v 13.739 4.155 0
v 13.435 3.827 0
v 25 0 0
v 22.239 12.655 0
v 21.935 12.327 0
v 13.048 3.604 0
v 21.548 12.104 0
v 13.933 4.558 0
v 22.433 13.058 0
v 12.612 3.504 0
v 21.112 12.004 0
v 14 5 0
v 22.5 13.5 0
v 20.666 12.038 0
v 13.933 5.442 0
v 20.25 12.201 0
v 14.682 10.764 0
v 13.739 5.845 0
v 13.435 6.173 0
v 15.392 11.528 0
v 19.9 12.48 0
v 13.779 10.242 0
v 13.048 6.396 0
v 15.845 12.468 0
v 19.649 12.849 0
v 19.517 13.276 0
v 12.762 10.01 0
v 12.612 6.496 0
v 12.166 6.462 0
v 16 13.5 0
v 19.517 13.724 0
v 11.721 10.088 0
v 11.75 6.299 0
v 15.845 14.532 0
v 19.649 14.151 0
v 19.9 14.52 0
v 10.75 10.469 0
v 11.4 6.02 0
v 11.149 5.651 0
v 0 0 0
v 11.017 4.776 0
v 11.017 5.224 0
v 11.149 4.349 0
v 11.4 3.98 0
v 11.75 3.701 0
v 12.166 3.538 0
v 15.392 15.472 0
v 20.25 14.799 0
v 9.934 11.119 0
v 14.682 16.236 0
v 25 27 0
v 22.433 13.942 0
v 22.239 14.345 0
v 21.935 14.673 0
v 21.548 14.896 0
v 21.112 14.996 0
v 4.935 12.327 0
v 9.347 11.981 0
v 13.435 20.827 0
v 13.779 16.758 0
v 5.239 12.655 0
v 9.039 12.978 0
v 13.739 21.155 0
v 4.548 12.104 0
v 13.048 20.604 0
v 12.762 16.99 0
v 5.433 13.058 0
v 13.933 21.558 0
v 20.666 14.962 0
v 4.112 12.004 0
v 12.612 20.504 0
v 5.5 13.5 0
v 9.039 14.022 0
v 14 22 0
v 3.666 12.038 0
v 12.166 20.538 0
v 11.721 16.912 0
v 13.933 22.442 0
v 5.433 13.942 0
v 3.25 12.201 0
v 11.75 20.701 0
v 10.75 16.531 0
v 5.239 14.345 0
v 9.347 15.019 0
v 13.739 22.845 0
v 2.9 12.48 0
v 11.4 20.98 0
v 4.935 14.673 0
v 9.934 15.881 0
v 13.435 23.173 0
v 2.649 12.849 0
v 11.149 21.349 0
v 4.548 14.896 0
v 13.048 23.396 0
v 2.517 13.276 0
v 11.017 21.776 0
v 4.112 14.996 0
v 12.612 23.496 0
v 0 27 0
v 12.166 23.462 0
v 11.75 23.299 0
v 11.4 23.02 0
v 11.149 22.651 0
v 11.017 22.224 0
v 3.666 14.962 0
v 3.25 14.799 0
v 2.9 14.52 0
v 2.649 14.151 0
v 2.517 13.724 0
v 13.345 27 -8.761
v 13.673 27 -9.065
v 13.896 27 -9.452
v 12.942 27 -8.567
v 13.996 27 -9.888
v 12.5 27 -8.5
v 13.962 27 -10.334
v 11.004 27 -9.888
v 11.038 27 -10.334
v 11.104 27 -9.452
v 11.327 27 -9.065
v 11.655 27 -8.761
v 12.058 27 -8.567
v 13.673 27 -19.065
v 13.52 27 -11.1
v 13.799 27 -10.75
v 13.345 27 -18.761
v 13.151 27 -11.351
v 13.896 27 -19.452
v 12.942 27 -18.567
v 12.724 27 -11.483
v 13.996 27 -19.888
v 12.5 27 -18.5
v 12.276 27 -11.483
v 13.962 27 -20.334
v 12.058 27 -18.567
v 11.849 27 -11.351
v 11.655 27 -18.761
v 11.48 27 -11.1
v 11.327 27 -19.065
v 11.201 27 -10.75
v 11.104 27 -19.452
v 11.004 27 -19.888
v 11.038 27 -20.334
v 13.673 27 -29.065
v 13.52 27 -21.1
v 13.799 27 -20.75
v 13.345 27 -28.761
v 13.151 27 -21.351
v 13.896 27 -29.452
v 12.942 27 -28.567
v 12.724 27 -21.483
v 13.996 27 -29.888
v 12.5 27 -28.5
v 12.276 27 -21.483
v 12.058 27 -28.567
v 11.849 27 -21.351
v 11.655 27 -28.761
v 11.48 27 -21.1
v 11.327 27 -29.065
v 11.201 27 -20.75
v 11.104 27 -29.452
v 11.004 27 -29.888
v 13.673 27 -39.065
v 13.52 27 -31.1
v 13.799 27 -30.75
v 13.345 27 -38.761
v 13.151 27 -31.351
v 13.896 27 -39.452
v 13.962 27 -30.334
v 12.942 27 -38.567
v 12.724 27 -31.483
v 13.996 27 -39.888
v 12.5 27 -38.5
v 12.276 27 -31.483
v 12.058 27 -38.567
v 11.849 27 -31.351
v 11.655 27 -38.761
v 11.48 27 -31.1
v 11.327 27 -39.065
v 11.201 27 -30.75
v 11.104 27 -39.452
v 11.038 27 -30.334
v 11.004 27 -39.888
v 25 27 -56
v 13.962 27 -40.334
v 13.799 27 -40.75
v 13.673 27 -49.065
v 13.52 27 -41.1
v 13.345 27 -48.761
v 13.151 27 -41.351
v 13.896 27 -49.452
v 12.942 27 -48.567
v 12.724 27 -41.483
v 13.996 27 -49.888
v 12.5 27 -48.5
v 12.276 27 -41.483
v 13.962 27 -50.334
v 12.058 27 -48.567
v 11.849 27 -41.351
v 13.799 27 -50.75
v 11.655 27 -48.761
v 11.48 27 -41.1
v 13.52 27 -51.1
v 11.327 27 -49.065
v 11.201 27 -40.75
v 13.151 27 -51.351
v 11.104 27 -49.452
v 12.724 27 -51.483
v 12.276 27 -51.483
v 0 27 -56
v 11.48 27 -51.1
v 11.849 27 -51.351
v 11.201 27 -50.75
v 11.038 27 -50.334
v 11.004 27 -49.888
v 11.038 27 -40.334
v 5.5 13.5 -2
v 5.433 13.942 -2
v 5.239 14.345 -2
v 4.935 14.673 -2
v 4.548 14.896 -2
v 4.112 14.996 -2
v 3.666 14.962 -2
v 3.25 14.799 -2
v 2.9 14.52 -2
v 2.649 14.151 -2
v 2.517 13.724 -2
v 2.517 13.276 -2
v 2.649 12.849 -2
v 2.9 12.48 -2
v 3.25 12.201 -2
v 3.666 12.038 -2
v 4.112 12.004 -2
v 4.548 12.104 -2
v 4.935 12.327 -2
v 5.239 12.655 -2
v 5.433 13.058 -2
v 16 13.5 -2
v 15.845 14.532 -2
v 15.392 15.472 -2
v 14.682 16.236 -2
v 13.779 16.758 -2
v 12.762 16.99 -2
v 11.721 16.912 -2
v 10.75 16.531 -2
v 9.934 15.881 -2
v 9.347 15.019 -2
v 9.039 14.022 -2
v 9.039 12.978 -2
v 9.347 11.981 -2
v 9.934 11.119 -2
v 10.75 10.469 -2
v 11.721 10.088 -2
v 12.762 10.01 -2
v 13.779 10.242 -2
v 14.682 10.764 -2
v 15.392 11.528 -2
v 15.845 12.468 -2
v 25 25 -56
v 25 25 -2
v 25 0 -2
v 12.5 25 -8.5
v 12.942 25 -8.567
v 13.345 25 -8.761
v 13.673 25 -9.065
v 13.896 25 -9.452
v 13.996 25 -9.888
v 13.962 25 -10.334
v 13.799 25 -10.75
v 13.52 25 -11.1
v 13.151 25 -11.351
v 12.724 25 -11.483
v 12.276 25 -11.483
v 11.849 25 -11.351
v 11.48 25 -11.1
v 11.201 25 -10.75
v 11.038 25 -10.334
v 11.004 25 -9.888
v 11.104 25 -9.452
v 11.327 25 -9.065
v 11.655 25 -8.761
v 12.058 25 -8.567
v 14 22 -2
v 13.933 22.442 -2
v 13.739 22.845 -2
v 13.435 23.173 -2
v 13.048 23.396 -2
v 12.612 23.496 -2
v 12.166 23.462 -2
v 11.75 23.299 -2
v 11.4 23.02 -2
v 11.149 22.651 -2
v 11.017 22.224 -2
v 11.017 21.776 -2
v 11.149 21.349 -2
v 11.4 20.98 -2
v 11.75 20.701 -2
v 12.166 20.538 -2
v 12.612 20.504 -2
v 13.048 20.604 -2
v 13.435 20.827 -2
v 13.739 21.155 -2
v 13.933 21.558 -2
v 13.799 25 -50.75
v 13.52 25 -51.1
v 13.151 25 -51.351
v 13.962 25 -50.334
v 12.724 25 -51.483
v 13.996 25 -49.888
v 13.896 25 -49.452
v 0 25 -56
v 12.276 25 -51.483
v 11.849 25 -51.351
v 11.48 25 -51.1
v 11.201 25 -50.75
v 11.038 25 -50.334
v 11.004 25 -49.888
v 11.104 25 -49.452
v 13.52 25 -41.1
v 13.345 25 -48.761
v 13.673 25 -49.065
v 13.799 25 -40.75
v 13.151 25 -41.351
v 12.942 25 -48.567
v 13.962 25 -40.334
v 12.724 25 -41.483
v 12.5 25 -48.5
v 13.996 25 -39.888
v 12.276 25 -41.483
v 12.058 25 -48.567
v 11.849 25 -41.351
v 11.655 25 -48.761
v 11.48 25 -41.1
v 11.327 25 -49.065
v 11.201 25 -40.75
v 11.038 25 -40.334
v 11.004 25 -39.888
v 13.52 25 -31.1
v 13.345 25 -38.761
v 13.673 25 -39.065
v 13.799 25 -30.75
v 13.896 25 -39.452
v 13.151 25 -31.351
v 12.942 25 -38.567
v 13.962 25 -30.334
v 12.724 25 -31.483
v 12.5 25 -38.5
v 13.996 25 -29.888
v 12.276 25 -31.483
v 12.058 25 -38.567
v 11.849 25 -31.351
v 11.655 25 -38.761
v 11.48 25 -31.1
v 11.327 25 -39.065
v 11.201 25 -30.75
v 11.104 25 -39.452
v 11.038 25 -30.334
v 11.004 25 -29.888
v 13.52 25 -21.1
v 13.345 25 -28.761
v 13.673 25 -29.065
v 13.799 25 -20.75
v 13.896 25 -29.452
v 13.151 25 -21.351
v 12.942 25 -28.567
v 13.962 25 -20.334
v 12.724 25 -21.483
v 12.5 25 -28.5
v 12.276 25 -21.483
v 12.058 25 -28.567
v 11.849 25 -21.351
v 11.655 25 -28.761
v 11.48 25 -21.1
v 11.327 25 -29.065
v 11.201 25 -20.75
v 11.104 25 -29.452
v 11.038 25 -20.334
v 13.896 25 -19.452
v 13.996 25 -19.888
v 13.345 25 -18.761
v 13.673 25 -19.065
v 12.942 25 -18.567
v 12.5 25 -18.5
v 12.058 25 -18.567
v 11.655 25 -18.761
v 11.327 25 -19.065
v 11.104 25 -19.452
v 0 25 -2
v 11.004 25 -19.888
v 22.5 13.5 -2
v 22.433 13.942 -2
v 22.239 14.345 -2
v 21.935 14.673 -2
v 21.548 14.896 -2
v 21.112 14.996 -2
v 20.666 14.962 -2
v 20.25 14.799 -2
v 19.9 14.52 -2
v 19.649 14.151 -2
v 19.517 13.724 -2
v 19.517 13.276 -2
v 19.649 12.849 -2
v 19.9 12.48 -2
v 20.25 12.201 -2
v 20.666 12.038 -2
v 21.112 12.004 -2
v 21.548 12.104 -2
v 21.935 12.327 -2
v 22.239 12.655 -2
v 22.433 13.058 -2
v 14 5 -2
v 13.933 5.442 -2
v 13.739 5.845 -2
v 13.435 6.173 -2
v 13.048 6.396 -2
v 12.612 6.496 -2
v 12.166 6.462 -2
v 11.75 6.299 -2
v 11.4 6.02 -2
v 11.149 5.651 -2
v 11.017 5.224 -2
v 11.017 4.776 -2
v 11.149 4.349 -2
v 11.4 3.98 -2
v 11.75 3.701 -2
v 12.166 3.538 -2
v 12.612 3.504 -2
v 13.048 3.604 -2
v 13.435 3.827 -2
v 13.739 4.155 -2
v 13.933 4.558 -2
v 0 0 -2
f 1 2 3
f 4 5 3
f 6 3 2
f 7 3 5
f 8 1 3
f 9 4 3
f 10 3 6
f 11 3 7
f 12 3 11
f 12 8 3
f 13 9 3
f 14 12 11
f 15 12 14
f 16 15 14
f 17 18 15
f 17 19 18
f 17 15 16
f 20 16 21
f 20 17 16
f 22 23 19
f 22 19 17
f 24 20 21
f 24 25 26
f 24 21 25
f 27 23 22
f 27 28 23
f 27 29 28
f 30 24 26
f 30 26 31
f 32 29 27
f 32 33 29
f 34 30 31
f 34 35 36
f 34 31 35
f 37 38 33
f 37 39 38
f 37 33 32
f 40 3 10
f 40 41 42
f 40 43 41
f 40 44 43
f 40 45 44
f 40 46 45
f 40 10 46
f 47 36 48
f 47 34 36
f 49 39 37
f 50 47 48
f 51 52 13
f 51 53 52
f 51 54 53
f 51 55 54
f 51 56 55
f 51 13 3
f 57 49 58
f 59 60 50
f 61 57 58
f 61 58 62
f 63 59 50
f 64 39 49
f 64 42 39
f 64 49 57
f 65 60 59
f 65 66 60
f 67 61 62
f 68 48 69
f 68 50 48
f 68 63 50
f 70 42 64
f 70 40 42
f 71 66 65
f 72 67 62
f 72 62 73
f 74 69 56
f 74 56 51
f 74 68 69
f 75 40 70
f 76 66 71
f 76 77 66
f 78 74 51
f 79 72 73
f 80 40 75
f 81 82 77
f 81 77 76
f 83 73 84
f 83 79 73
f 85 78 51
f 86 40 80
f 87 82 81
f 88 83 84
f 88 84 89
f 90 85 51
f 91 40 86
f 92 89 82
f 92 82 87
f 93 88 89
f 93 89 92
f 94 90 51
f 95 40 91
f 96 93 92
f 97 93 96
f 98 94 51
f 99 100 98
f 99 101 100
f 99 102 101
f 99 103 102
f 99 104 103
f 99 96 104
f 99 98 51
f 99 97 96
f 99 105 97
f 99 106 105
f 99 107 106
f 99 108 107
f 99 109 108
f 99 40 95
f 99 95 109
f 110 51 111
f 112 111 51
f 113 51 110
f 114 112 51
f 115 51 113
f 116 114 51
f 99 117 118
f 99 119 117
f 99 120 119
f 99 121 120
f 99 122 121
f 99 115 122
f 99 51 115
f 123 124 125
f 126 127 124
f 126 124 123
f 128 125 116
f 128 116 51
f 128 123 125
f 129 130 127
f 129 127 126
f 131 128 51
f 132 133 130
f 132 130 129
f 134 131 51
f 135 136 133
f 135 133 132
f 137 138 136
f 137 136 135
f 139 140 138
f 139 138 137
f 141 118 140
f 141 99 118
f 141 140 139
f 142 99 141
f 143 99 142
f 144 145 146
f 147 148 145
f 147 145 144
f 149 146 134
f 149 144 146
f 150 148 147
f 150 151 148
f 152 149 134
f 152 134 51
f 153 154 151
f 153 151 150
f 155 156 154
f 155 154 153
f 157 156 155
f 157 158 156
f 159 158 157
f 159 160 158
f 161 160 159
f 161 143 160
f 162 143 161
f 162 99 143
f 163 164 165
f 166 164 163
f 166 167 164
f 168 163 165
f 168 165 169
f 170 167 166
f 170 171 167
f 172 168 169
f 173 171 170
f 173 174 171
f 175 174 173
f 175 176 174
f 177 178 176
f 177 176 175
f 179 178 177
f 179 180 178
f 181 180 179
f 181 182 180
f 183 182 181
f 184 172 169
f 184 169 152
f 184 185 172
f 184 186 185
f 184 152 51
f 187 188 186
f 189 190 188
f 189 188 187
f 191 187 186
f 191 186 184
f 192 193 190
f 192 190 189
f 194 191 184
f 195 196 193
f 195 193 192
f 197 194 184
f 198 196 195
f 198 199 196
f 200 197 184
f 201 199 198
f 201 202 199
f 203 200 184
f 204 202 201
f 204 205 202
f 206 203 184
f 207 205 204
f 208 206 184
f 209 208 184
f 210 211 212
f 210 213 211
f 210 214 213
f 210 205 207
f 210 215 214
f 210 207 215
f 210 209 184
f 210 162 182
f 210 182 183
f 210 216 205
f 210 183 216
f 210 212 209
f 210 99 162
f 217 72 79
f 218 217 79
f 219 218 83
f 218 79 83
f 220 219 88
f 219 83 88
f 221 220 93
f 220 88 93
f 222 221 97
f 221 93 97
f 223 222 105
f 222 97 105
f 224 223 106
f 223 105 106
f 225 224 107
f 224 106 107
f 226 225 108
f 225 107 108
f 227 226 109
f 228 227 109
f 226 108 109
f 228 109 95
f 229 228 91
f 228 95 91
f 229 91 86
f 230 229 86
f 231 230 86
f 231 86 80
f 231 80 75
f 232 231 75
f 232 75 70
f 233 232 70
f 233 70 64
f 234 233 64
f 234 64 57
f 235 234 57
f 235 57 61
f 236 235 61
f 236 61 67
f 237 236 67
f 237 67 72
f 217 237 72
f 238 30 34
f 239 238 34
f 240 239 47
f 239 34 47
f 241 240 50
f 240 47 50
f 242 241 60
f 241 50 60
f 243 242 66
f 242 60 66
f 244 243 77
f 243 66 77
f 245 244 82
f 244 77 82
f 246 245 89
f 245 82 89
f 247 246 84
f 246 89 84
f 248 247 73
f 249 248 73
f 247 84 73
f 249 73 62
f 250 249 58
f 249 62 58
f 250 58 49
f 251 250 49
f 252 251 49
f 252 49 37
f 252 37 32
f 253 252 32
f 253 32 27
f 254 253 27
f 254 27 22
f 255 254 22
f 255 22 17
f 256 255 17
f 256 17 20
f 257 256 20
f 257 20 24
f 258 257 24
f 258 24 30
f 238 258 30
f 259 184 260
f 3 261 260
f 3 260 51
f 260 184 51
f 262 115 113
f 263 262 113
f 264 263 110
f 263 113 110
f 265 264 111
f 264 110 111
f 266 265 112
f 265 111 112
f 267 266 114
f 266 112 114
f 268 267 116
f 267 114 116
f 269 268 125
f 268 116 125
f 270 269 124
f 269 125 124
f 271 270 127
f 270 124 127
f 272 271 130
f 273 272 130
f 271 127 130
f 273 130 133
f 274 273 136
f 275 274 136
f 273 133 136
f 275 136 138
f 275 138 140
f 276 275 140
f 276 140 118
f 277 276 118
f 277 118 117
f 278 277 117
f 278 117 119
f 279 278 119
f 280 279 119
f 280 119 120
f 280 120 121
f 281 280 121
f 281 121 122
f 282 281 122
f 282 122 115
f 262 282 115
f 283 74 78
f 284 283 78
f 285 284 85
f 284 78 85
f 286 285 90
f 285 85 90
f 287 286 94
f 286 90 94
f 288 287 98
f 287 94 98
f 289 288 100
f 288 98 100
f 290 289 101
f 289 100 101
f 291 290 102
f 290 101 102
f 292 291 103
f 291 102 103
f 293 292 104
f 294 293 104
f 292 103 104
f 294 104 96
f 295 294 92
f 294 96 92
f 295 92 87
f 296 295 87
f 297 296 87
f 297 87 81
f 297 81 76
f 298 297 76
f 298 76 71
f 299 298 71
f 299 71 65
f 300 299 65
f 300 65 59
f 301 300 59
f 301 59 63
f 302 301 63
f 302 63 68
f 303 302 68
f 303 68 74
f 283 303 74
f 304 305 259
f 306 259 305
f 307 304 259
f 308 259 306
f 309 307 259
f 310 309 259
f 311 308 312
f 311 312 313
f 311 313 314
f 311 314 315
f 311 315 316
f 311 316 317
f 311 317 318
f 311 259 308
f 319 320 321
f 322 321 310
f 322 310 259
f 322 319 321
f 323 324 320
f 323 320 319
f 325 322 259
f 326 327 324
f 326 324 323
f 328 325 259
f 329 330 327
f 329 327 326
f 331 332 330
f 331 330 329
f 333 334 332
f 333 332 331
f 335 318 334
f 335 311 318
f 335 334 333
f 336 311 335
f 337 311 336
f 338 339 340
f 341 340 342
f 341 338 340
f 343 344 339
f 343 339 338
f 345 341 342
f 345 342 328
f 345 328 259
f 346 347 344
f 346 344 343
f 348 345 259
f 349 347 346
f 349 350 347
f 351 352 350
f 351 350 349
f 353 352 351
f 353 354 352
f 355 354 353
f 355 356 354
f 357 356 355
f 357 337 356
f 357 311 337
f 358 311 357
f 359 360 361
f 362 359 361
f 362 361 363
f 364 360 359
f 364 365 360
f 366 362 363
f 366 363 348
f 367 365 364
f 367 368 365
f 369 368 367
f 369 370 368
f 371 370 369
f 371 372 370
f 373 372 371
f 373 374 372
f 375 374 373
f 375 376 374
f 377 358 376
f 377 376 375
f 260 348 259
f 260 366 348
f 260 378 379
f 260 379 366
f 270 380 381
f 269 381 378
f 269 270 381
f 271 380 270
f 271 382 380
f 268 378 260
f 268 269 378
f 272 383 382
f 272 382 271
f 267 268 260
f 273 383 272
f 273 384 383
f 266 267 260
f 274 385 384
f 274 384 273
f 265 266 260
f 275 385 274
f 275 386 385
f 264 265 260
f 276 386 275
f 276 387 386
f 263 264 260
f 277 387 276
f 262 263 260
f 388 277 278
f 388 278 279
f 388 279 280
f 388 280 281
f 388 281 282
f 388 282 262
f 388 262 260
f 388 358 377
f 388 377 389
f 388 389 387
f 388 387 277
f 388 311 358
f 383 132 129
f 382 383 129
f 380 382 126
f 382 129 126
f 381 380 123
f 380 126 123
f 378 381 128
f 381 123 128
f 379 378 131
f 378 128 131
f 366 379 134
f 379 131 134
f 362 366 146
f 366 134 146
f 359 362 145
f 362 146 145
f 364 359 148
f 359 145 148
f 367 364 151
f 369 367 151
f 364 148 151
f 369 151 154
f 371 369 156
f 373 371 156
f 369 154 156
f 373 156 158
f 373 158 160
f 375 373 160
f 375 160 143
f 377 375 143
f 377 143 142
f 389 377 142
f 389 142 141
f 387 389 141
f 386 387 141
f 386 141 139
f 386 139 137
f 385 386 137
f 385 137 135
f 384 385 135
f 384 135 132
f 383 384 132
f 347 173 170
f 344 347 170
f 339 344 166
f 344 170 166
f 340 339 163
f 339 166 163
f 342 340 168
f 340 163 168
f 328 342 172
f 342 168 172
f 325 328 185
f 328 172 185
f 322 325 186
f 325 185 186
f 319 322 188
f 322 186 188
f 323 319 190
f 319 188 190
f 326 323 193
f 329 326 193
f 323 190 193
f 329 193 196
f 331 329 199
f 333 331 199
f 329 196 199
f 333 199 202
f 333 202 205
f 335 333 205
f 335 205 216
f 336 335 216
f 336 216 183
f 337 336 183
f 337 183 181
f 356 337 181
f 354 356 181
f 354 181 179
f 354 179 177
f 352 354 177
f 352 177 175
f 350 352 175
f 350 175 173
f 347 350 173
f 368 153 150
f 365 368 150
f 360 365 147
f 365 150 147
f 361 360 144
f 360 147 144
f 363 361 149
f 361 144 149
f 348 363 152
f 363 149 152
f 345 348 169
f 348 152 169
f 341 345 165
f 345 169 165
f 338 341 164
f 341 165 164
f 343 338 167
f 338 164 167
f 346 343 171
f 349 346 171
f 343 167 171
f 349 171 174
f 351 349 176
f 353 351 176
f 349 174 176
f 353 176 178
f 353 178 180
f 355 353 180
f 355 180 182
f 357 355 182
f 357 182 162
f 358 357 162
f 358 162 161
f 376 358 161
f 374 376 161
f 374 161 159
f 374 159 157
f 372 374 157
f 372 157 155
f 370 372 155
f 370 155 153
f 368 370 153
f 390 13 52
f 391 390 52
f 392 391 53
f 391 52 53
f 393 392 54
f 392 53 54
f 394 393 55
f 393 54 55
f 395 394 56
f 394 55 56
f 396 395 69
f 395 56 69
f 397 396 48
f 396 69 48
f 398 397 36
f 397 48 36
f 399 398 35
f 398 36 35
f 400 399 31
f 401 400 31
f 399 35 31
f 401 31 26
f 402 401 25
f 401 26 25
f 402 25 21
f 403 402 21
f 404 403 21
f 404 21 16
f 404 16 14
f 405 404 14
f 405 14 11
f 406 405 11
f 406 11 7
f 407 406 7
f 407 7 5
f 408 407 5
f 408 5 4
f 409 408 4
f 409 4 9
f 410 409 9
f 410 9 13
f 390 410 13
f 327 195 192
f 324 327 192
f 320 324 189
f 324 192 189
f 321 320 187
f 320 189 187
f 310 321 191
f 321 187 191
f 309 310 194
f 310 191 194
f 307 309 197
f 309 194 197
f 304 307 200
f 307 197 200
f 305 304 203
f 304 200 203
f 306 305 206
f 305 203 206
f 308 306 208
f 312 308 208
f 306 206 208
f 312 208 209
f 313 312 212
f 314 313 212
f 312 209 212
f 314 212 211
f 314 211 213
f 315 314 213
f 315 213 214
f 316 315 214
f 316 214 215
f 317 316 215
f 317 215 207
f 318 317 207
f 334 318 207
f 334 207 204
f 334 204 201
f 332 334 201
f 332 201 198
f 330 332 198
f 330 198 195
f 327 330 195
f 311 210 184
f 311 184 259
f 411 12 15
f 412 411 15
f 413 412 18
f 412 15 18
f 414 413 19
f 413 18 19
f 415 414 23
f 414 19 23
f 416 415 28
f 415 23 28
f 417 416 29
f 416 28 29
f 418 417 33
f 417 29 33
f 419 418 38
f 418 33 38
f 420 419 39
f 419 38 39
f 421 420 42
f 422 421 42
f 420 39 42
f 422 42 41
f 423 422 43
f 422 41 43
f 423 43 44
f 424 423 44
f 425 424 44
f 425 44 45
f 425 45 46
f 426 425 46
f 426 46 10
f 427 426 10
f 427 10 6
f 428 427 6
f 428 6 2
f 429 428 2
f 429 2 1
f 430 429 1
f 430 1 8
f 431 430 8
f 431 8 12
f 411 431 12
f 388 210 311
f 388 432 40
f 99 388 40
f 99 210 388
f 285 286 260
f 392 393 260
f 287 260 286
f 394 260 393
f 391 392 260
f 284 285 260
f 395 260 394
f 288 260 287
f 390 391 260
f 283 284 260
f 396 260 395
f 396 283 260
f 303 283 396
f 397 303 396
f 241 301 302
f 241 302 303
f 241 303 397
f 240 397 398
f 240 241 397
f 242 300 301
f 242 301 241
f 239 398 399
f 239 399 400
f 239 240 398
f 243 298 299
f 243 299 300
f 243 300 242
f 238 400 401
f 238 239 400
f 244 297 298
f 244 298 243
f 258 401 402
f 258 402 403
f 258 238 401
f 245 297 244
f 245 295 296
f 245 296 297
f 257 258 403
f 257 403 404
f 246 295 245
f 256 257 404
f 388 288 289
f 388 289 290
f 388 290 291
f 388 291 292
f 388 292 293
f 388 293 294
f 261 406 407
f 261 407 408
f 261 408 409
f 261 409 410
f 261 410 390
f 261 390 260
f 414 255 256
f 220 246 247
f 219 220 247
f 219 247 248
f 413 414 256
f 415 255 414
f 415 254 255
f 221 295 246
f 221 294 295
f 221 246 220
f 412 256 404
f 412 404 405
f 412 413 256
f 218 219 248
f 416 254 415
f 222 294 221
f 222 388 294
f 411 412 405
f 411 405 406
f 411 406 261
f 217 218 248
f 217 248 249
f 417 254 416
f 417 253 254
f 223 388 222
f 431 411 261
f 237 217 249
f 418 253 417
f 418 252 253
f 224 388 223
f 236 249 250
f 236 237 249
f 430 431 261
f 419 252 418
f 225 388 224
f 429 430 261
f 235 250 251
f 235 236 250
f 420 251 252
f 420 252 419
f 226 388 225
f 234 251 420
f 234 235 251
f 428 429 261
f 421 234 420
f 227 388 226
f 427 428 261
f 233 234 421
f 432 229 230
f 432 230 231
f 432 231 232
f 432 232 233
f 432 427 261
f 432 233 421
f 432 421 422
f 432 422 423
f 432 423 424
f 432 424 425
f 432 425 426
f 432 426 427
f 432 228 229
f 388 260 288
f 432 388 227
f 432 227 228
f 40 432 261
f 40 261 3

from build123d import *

# Parameters (mm, degrees)
BOSS_EXTRUDE1_DEPTH = 25
SKETCH2_R           = 1.5
SKETCH2_R_2         = 3.5
CUT_EXTRUDE1_DEPTH  = 25
SKETCH3_R           = 1.5
CUT_EXTRUDE2_DEPTH  = 25


with BuildPart() as part:
    # Sketch1 → Boss-Extrude1 (new body)
    with BuildSketch(Plane(origin=(0, 0, 0), x_dir=(0, 0, -1), z_dir=(1, 0, 0))):
        Polygon((0, 0), (0, 27), (56, 27), (56, 25), (2, 25), (2, 0), align=None)
    extrude(amount=BOSS_EXTRUDE1_DEPTH)

    # Sketch2 → Cut-Extrude1 (cut)
    with BuildSketch(Plane.XY):
        with Locations((4, 13.5)):
            Circle(SKETCH2_R)
        with Locations((12.5, 13.5)):
            Circle(SKETCH2_R_2)
        with Locations((12.5, 22)):
            Circle(SKETCH2_R)
        with Locations((21, 13.5)):
            Circle(SKETCH2_R)
        with Locations((12.5, 5)):
            Circle(SKETCH2_R)
    extrude(amount=-CUT_EXTRUDE1_DEPTH, mode=Mode.SUBTRACT)

    # Sketch3 → Cut-Extrude2 (cut)
    with BuildSketch(Plane(origin=(0, 27, 0), x_dir=(1, 0, 0), z_dir=(0, 1, 0))):
        with Locations(Location((12.5, 10, 0), (0, 0, 270))):
            Circle(SKETCH3_R)
        with Locations(Location((12.5, 20, 0), (0, 0, 270))):
            Circle(SKETCH3_R)
        with Locations(Location((12.5, 30, 0), (0, 0, 270))):
            Circle(SKETCH3_R)
        with Locations(Location((12.5, 40, 0), (0, 0, 270))):
            Circle(SKETCH3_R)
        with Locations(Location((12.5, 50, 0), (0, 0, 270))):
            Circle(SKETCH3_R)
    extrude(amount=-CUT_EXTRUDE2_DEPTH, mode=Mode.SUBTRACT)


solid = part.part
